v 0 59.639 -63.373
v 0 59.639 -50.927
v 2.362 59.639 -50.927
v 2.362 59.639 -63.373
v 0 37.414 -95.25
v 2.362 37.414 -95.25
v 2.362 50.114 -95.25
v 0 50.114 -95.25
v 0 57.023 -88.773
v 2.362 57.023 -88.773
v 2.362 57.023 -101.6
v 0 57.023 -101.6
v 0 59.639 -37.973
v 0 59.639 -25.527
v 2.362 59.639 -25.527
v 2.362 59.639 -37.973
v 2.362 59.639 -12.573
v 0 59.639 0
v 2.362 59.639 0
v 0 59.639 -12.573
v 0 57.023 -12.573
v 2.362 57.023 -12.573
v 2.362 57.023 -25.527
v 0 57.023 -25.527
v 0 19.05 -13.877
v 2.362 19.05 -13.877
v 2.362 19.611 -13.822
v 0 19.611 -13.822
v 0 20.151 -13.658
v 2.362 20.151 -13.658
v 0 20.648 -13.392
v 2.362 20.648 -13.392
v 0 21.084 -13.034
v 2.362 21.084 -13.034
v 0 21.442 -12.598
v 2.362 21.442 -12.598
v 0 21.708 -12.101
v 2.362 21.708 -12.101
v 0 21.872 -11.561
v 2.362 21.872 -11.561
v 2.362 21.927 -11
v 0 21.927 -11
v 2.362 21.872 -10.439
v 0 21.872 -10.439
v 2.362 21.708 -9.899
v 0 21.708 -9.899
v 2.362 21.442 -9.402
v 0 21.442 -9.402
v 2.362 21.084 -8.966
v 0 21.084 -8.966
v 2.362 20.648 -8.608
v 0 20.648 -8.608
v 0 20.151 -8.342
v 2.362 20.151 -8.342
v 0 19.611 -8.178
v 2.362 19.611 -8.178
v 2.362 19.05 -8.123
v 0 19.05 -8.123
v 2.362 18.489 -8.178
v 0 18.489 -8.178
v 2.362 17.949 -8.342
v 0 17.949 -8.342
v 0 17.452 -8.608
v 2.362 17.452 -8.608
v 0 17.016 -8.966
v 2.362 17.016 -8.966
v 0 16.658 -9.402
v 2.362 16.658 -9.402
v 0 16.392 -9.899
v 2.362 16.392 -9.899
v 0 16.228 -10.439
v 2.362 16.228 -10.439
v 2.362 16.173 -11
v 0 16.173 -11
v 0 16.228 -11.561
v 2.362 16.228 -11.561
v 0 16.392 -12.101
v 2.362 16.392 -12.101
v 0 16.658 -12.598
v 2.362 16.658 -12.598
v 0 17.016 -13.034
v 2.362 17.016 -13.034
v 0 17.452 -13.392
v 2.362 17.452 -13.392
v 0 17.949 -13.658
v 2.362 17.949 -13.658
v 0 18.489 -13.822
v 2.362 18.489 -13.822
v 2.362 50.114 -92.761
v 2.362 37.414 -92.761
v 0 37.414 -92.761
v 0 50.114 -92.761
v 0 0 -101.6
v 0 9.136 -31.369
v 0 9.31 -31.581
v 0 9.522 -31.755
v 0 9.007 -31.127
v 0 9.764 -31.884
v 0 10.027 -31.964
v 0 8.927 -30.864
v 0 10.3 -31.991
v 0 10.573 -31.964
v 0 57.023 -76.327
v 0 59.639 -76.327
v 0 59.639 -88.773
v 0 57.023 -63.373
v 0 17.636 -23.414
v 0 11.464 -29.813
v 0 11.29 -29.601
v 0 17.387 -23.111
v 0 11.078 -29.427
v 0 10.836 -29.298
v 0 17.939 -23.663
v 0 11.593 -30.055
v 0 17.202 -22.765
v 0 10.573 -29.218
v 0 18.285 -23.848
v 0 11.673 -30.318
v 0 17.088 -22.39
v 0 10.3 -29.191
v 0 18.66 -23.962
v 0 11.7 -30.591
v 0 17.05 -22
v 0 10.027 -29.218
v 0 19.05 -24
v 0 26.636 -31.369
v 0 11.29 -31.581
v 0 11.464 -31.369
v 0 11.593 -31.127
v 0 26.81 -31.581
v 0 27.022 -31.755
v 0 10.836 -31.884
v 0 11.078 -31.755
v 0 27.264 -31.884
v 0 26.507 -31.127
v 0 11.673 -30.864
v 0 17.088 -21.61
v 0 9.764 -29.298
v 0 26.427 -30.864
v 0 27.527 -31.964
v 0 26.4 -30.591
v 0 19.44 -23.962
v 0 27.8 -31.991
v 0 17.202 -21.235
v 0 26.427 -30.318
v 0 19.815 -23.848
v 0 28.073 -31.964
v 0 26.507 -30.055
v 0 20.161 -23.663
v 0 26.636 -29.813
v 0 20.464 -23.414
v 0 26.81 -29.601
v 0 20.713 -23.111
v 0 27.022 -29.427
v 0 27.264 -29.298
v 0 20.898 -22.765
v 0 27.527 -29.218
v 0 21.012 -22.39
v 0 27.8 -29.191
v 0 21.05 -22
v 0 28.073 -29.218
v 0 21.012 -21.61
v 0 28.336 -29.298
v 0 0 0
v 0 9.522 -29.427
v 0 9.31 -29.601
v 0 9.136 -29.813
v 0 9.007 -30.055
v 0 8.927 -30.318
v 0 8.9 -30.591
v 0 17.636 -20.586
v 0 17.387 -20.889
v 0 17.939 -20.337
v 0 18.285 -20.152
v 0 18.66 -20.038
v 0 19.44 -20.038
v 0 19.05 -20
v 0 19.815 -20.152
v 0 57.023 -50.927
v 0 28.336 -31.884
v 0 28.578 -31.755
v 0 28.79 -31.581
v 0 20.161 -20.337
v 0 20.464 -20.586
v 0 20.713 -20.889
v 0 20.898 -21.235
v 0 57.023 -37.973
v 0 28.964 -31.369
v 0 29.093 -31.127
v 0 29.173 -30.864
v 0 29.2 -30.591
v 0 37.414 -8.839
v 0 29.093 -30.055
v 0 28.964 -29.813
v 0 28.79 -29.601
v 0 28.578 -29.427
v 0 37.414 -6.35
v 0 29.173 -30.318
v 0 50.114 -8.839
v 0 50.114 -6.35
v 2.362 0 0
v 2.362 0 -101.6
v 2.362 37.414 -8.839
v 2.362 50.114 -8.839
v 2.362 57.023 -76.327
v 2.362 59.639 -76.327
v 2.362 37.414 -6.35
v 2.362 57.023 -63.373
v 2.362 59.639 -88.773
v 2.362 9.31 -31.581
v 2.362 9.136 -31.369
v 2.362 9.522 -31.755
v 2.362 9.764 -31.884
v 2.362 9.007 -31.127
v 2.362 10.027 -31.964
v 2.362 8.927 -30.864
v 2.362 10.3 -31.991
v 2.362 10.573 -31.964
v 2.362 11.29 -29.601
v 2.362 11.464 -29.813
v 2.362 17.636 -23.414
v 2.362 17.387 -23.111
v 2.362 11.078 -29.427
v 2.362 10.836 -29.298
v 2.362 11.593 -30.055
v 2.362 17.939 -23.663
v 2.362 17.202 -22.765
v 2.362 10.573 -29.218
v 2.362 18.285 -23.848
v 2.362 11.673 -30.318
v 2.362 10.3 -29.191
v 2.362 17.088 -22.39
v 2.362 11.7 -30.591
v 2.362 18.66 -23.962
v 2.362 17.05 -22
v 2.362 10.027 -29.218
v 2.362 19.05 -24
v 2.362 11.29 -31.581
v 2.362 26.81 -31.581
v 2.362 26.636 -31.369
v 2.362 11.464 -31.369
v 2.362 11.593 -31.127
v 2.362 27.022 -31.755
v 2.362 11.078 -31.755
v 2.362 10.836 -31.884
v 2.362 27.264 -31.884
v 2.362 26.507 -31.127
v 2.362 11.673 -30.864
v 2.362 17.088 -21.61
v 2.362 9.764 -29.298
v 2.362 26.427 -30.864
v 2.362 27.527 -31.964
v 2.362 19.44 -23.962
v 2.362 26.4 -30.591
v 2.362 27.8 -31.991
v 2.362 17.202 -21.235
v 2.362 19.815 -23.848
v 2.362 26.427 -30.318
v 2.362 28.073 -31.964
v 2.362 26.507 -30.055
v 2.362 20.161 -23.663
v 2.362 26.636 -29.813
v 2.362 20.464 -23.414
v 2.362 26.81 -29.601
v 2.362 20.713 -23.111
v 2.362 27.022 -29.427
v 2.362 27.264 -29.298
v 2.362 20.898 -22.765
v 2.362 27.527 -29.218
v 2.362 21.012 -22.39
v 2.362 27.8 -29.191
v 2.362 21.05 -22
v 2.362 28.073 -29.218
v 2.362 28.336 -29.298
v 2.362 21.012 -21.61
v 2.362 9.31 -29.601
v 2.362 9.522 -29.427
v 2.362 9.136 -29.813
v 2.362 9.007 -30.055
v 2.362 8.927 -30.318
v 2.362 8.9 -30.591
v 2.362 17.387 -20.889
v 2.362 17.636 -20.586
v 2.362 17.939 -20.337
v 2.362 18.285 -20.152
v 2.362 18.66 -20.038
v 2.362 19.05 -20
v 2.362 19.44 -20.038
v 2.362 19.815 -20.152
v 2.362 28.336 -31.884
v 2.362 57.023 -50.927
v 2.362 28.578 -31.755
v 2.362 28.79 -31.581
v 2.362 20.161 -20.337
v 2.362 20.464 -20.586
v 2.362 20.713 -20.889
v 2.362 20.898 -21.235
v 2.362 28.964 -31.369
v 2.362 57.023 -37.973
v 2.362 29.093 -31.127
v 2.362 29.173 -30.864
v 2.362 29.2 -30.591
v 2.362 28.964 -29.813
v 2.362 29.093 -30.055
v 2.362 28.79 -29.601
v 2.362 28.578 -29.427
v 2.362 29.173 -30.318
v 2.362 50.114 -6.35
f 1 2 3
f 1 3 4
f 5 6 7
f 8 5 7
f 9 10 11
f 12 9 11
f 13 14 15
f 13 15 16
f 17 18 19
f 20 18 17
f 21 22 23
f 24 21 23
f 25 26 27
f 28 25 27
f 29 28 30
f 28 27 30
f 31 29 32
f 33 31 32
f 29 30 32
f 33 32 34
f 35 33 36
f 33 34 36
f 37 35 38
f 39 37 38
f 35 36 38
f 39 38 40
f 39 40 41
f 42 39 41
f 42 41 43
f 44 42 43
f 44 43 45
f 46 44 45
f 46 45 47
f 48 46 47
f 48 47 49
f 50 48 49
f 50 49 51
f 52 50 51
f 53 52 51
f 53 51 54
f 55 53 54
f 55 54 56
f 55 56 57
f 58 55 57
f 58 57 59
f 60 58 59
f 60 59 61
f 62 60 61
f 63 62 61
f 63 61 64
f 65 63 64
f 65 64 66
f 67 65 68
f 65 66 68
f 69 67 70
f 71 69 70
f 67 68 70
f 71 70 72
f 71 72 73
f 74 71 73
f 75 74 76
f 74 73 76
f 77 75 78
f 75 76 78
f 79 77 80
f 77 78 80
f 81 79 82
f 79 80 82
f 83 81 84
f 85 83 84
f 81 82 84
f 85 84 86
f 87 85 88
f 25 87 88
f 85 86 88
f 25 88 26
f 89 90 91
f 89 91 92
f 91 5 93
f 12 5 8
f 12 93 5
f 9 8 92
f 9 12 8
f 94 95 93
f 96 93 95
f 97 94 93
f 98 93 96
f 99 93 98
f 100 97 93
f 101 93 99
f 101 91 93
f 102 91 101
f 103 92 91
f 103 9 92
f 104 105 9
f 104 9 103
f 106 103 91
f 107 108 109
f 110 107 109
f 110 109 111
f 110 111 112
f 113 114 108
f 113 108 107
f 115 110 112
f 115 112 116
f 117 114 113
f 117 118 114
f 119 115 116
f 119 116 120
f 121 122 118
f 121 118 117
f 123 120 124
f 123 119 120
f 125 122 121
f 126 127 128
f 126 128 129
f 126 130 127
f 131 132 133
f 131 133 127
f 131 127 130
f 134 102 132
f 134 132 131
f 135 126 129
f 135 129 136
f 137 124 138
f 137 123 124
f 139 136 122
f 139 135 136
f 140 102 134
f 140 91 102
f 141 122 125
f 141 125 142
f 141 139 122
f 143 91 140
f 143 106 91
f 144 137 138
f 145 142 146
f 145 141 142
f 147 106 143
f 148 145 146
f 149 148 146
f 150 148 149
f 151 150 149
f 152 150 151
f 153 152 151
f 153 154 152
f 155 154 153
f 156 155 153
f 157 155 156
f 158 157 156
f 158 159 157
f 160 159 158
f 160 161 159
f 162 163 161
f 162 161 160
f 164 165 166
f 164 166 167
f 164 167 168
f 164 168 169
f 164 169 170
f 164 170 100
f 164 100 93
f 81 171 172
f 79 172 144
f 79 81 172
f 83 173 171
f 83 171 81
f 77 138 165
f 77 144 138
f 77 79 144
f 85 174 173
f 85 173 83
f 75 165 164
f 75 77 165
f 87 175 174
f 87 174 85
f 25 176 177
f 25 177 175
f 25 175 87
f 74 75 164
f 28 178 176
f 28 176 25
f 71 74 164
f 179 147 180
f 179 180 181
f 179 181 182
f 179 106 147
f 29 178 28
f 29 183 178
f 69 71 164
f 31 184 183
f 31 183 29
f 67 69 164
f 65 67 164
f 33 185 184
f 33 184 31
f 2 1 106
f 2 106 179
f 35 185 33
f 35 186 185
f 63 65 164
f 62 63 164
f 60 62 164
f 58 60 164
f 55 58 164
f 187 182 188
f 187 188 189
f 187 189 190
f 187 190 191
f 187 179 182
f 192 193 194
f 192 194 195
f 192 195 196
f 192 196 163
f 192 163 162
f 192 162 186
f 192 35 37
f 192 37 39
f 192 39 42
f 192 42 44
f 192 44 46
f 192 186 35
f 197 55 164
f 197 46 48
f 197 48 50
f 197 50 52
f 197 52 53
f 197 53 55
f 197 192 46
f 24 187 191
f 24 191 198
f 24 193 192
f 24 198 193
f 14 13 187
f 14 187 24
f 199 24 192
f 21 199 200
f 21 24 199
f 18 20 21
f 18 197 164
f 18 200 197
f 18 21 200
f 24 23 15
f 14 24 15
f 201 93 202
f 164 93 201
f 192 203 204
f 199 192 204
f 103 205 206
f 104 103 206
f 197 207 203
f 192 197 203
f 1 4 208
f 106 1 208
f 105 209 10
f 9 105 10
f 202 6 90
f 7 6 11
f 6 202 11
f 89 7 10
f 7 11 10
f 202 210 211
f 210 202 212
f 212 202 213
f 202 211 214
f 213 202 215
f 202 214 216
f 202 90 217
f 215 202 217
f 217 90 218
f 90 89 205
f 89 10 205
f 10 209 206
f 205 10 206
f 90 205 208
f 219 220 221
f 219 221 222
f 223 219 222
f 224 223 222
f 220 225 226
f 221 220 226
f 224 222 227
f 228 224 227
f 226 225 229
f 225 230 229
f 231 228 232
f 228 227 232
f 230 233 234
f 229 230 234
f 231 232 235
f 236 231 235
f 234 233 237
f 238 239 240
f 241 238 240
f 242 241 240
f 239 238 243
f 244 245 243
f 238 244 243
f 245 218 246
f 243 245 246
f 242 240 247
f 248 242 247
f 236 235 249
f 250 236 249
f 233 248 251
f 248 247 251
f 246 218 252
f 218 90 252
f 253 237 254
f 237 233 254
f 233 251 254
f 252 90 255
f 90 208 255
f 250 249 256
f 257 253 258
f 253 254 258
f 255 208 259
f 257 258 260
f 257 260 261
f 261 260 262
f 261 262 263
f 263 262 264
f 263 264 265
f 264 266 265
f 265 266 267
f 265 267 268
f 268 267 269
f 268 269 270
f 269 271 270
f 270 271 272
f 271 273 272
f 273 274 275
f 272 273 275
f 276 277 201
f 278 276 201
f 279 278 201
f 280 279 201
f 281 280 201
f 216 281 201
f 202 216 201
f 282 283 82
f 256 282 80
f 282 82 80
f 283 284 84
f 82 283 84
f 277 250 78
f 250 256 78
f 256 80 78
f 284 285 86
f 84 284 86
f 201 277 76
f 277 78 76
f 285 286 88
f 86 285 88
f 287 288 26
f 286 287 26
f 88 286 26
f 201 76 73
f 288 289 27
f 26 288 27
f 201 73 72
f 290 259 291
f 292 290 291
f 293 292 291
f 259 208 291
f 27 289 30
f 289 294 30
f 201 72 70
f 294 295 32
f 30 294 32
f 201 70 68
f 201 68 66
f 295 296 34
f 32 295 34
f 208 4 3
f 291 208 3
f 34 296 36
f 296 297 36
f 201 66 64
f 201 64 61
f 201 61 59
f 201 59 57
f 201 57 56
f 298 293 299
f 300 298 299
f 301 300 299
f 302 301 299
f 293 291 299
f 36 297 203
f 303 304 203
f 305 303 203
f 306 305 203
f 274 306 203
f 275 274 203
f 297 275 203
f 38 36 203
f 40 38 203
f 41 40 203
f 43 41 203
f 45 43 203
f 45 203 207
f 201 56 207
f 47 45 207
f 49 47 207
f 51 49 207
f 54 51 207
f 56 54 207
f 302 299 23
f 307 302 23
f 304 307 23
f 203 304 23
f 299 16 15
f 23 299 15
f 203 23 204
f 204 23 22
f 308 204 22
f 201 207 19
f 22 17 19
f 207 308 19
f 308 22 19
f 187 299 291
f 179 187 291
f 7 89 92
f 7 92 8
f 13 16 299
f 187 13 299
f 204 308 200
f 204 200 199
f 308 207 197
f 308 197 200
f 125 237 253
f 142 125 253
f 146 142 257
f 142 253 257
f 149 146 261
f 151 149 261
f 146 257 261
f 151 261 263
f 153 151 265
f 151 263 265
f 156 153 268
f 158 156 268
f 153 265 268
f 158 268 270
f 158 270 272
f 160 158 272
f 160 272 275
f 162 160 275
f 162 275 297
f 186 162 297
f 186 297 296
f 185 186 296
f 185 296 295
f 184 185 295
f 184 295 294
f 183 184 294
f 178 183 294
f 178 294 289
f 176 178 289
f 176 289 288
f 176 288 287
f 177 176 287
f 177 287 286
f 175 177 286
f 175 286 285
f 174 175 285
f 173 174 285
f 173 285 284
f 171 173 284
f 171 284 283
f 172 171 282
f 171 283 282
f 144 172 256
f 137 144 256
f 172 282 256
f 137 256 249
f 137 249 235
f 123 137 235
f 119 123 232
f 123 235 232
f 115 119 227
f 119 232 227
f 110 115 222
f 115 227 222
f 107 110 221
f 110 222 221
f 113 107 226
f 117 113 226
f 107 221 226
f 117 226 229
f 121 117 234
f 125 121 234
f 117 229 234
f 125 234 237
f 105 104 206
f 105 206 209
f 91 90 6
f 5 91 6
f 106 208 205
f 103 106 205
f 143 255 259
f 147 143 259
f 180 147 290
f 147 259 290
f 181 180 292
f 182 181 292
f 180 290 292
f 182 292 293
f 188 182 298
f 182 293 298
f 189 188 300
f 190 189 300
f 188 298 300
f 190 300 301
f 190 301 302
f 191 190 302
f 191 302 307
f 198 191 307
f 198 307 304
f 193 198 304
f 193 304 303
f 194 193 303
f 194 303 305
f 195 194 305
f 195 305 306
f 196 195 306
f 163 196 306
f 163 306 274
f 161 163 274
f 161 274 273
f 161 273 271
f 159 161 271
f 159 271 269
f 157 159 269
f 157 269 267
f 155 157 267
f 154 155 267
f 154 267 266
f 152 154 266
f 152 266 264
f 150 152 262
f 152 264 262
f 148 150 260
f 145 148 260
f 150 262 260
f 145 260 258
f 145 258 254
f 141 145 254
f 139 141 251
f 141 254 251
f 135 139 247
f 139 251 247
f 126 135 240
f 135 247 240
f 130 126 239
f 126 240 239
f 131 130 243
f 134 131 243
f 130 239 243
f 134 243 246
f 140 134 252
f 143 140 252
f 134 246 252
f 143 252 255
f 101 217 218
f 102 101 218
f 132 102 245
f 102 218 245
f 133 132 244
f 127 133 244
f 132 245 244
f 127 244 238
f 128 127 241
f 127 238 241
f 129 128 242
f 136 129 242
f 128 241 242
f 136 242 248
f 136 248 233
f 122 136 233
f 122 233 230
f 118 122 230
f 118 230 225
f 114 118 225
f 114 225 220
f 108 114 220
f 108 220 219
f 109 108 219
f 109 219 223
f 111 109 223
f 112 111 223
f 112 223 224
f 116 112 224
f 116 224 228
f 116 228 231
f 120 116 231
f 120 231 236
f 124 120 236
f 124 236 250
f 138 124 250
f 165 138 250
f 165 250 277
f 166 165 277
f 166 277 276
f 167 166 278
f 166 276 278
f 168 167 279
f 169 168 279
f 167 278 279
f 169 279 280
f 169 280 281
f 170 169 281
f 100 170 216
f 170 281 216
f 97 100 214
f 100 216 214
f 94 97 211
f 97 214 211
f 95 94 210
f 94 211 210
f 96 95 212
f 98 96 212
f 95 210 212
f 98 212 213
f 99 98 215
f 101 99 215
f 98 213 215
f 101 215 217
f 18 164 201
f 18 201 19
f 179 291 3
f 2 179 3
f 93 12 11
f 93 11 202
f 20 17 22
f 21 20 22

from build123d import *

# Parameters (mm, degrees)
BOSS_EXTRUDE1_DEPTH = 2.3622
CUT_EXTRUDE1_REACH  = 4.362
SKETCH2_R           = 1.4
SKETCH2_R_2         = 2
SKETCH2_R_3         = 2.876999961
CUT_EXTRUDE2_DEPTH  = 3.3622
SKETCH4_W           = 2.4892
SKETCH4_H           = 12.7
CUT_EXTRUDE3_DEPTH  = 3.3622


with BuildPart() as part:
    # Sketch1 → Boss-Extrude1 (new body)
    with BuildSketch(Plane(origin=(0, 0, 0), x_dir=(0, 0, -1), z_dir=(1, 0, 0))):
        Polygon((0, 0), (0, 59.6392), (12.7, 59.6392), (12.7, 57.15), (25.4, 57.15), (25.4, 59.6392), (38.1, 59.6392), (38.1, 57.15), (50.8, 57.15), (50.8, 59.6392), (63.5, 59.6392), (63.5, 57.15), (76.2, 57.15), (76.2, 59.6392), (88.9, 59.6392), (88.9, 57.15), (101.6, 57.15), (101.6, 0), align=None)
    extrude(amount=BOSS_EXTRUDE1_DEPTH)

    # Sketch2 → Cut-Extrude1 (cut, up to next)
    with BuildSketch(Plane(origin=(2.3622, 0, 0), x_dir=(0, 0, -1), z_dir=(1, 0, 0)), mode=Mode.PRIVATE) as cut_extrude1_sk1:
        with Locations((30.59102, 10.3)):
            Circle(SKETCH2_R)
    cut_extrude1_tool1 = extrude(cut_extrude1_sk1.sketch, amount=-CUT_EXTRUDE1_REACH, mode=Mode.PRIVATE) & part.part
    add(cut_extrude1_tool1.solids().sort_by_distance((2.3622, 10.3, -30.59102))[0], mode=Mode.SUBTRACT)
    # Sketch2 → Cut-Extrude1 (cut, up to next)
    with BuildSketch(Plane(origin=(2.3622, 0, 0), x_dir=(0, 0, -1), z_dir=(1, 0, 0)), mode=Mode.PRIVATE) as cut_extrude1_sk2:
        with Locations((30.59102, 27.8)):
            Circle(SKETCH2_R)
    cut_extrude1_tool2 = extrude(cut_extrude1_sk2.sketch, amount=-CUT_EXTRUDE1_REACH, mode=Mode.PRIVATE) & part.part
    add(cut_extrude1_tool2.solids().sort_by_distance((2.3622, 27.8, -30.59102))[0], mode=Mode.SUBTRACT)
    # Sketch2 → Cut-Extrude1 (cut, up to next)
    with BuildSketch(Plane(origin=(2.3622, 0, 0), x_dir=(0, 0, -1), z_dir=(1, 0, 0)), mode=Mode.PRIVATE) as cut_extrude1_sk3:
        with Locations((22.0000034, 19.05)):
            Circle(SKETCH2_R_2)
    cut_extrude1_tool3 = extrude(cut_extrude1_sk3.sketch, amount=-CUT_EXTRUDE1_REACH, mode=Mode.PRIVATE) & part.part
    add(cut_extrude1_tool3.solids().sort_by_distance((2.3622, 19.05, -22.000003))[0], mode=Mode.SUBTRACT)
    # Sketch2 → Cut-Extrude1 (cut, up to next)
    with BuildSketch(Plane(origin=(2.3622, 0, 0), x_dir=(0, 0, -1), z_dir=(1, 0, 0)), mode=Mode.PRIVATE) as cut_extrude1_sk4:
        with Locations((11, 19.05)):
            Circle(SKETCH2_R_3)
    cut_extrude1_tool4 = extrude(cut_extrude1_sk4.sketch, amount=-CUT_EXTRUDE1_REACH, mode=Mode.PRIVATE) & part.part
    add(cut_extrude1_tool4.solids().sort_by_distance((2.3622, 19.05, -11))[0], mode=Mode.SUBTRACT)

    # Sketch3 → Cut-Extrude2 (cut, through all)
    with BuildSketch(Plane(origin=(2.3622, 0, 0), x_dir=(0, 0, -1), z_dir=(1, 0, 0))):
        Polygon((12.7, 57.15), (12.7, 59.6392), (12.573, 59.6392), (12.573, 57.023), (25.527, 57.023), (25.527, 59.6392), (25.4, 59.6392), (25.4, 57.15), align=None)
        Polygon((38.1, 59.6392), (37.973, 59.6392), (37.973, 57.023), (50.927, 57.023), (50.927, 59.6392), (50.8, 59.6392), (50.8, 57.15), (38.1, 57.15), align=None)
        Polygon((63.5, 59.6392), (63.373, 59.6392), (63.373, 57.023), (76.327, 57.023), (76.327, 59.6392), (76.2, 59.6392), (76.2, 57.15), (63.5, 57.15), align=None)
        Polygon((88.9, 59.6392), (88.773, 59.6392), (88.773, 57.023), (101.6, 57.023), (101.6, 57.15), (88.9, 57.15), align=None)
    extrude(amount=-CUT_EXTRUDE2_DEPTH, mode=Mode.SUBTRACT)

    # Sketch4 → Cut-Extrude3 (cut, through all)
    with BuildSketch(Plane(origin=(2.3622, 0, 0), x_dir=(0, 0, -1), z_dir=(1, 0, 0))):
        with Locations((7.5946, 43.7642)):
            Rectangle(SKETCH4_W, SKETCH4_H)
        with Locations((94.0054, 43.7642)):
            Rectangle(SKETCH4_W, SKETCH4_H)
    extrude(amount=-CUT_EXTRUDE3_DEPTH, mode=Mode.SUBTRACT)


solid = part.part
